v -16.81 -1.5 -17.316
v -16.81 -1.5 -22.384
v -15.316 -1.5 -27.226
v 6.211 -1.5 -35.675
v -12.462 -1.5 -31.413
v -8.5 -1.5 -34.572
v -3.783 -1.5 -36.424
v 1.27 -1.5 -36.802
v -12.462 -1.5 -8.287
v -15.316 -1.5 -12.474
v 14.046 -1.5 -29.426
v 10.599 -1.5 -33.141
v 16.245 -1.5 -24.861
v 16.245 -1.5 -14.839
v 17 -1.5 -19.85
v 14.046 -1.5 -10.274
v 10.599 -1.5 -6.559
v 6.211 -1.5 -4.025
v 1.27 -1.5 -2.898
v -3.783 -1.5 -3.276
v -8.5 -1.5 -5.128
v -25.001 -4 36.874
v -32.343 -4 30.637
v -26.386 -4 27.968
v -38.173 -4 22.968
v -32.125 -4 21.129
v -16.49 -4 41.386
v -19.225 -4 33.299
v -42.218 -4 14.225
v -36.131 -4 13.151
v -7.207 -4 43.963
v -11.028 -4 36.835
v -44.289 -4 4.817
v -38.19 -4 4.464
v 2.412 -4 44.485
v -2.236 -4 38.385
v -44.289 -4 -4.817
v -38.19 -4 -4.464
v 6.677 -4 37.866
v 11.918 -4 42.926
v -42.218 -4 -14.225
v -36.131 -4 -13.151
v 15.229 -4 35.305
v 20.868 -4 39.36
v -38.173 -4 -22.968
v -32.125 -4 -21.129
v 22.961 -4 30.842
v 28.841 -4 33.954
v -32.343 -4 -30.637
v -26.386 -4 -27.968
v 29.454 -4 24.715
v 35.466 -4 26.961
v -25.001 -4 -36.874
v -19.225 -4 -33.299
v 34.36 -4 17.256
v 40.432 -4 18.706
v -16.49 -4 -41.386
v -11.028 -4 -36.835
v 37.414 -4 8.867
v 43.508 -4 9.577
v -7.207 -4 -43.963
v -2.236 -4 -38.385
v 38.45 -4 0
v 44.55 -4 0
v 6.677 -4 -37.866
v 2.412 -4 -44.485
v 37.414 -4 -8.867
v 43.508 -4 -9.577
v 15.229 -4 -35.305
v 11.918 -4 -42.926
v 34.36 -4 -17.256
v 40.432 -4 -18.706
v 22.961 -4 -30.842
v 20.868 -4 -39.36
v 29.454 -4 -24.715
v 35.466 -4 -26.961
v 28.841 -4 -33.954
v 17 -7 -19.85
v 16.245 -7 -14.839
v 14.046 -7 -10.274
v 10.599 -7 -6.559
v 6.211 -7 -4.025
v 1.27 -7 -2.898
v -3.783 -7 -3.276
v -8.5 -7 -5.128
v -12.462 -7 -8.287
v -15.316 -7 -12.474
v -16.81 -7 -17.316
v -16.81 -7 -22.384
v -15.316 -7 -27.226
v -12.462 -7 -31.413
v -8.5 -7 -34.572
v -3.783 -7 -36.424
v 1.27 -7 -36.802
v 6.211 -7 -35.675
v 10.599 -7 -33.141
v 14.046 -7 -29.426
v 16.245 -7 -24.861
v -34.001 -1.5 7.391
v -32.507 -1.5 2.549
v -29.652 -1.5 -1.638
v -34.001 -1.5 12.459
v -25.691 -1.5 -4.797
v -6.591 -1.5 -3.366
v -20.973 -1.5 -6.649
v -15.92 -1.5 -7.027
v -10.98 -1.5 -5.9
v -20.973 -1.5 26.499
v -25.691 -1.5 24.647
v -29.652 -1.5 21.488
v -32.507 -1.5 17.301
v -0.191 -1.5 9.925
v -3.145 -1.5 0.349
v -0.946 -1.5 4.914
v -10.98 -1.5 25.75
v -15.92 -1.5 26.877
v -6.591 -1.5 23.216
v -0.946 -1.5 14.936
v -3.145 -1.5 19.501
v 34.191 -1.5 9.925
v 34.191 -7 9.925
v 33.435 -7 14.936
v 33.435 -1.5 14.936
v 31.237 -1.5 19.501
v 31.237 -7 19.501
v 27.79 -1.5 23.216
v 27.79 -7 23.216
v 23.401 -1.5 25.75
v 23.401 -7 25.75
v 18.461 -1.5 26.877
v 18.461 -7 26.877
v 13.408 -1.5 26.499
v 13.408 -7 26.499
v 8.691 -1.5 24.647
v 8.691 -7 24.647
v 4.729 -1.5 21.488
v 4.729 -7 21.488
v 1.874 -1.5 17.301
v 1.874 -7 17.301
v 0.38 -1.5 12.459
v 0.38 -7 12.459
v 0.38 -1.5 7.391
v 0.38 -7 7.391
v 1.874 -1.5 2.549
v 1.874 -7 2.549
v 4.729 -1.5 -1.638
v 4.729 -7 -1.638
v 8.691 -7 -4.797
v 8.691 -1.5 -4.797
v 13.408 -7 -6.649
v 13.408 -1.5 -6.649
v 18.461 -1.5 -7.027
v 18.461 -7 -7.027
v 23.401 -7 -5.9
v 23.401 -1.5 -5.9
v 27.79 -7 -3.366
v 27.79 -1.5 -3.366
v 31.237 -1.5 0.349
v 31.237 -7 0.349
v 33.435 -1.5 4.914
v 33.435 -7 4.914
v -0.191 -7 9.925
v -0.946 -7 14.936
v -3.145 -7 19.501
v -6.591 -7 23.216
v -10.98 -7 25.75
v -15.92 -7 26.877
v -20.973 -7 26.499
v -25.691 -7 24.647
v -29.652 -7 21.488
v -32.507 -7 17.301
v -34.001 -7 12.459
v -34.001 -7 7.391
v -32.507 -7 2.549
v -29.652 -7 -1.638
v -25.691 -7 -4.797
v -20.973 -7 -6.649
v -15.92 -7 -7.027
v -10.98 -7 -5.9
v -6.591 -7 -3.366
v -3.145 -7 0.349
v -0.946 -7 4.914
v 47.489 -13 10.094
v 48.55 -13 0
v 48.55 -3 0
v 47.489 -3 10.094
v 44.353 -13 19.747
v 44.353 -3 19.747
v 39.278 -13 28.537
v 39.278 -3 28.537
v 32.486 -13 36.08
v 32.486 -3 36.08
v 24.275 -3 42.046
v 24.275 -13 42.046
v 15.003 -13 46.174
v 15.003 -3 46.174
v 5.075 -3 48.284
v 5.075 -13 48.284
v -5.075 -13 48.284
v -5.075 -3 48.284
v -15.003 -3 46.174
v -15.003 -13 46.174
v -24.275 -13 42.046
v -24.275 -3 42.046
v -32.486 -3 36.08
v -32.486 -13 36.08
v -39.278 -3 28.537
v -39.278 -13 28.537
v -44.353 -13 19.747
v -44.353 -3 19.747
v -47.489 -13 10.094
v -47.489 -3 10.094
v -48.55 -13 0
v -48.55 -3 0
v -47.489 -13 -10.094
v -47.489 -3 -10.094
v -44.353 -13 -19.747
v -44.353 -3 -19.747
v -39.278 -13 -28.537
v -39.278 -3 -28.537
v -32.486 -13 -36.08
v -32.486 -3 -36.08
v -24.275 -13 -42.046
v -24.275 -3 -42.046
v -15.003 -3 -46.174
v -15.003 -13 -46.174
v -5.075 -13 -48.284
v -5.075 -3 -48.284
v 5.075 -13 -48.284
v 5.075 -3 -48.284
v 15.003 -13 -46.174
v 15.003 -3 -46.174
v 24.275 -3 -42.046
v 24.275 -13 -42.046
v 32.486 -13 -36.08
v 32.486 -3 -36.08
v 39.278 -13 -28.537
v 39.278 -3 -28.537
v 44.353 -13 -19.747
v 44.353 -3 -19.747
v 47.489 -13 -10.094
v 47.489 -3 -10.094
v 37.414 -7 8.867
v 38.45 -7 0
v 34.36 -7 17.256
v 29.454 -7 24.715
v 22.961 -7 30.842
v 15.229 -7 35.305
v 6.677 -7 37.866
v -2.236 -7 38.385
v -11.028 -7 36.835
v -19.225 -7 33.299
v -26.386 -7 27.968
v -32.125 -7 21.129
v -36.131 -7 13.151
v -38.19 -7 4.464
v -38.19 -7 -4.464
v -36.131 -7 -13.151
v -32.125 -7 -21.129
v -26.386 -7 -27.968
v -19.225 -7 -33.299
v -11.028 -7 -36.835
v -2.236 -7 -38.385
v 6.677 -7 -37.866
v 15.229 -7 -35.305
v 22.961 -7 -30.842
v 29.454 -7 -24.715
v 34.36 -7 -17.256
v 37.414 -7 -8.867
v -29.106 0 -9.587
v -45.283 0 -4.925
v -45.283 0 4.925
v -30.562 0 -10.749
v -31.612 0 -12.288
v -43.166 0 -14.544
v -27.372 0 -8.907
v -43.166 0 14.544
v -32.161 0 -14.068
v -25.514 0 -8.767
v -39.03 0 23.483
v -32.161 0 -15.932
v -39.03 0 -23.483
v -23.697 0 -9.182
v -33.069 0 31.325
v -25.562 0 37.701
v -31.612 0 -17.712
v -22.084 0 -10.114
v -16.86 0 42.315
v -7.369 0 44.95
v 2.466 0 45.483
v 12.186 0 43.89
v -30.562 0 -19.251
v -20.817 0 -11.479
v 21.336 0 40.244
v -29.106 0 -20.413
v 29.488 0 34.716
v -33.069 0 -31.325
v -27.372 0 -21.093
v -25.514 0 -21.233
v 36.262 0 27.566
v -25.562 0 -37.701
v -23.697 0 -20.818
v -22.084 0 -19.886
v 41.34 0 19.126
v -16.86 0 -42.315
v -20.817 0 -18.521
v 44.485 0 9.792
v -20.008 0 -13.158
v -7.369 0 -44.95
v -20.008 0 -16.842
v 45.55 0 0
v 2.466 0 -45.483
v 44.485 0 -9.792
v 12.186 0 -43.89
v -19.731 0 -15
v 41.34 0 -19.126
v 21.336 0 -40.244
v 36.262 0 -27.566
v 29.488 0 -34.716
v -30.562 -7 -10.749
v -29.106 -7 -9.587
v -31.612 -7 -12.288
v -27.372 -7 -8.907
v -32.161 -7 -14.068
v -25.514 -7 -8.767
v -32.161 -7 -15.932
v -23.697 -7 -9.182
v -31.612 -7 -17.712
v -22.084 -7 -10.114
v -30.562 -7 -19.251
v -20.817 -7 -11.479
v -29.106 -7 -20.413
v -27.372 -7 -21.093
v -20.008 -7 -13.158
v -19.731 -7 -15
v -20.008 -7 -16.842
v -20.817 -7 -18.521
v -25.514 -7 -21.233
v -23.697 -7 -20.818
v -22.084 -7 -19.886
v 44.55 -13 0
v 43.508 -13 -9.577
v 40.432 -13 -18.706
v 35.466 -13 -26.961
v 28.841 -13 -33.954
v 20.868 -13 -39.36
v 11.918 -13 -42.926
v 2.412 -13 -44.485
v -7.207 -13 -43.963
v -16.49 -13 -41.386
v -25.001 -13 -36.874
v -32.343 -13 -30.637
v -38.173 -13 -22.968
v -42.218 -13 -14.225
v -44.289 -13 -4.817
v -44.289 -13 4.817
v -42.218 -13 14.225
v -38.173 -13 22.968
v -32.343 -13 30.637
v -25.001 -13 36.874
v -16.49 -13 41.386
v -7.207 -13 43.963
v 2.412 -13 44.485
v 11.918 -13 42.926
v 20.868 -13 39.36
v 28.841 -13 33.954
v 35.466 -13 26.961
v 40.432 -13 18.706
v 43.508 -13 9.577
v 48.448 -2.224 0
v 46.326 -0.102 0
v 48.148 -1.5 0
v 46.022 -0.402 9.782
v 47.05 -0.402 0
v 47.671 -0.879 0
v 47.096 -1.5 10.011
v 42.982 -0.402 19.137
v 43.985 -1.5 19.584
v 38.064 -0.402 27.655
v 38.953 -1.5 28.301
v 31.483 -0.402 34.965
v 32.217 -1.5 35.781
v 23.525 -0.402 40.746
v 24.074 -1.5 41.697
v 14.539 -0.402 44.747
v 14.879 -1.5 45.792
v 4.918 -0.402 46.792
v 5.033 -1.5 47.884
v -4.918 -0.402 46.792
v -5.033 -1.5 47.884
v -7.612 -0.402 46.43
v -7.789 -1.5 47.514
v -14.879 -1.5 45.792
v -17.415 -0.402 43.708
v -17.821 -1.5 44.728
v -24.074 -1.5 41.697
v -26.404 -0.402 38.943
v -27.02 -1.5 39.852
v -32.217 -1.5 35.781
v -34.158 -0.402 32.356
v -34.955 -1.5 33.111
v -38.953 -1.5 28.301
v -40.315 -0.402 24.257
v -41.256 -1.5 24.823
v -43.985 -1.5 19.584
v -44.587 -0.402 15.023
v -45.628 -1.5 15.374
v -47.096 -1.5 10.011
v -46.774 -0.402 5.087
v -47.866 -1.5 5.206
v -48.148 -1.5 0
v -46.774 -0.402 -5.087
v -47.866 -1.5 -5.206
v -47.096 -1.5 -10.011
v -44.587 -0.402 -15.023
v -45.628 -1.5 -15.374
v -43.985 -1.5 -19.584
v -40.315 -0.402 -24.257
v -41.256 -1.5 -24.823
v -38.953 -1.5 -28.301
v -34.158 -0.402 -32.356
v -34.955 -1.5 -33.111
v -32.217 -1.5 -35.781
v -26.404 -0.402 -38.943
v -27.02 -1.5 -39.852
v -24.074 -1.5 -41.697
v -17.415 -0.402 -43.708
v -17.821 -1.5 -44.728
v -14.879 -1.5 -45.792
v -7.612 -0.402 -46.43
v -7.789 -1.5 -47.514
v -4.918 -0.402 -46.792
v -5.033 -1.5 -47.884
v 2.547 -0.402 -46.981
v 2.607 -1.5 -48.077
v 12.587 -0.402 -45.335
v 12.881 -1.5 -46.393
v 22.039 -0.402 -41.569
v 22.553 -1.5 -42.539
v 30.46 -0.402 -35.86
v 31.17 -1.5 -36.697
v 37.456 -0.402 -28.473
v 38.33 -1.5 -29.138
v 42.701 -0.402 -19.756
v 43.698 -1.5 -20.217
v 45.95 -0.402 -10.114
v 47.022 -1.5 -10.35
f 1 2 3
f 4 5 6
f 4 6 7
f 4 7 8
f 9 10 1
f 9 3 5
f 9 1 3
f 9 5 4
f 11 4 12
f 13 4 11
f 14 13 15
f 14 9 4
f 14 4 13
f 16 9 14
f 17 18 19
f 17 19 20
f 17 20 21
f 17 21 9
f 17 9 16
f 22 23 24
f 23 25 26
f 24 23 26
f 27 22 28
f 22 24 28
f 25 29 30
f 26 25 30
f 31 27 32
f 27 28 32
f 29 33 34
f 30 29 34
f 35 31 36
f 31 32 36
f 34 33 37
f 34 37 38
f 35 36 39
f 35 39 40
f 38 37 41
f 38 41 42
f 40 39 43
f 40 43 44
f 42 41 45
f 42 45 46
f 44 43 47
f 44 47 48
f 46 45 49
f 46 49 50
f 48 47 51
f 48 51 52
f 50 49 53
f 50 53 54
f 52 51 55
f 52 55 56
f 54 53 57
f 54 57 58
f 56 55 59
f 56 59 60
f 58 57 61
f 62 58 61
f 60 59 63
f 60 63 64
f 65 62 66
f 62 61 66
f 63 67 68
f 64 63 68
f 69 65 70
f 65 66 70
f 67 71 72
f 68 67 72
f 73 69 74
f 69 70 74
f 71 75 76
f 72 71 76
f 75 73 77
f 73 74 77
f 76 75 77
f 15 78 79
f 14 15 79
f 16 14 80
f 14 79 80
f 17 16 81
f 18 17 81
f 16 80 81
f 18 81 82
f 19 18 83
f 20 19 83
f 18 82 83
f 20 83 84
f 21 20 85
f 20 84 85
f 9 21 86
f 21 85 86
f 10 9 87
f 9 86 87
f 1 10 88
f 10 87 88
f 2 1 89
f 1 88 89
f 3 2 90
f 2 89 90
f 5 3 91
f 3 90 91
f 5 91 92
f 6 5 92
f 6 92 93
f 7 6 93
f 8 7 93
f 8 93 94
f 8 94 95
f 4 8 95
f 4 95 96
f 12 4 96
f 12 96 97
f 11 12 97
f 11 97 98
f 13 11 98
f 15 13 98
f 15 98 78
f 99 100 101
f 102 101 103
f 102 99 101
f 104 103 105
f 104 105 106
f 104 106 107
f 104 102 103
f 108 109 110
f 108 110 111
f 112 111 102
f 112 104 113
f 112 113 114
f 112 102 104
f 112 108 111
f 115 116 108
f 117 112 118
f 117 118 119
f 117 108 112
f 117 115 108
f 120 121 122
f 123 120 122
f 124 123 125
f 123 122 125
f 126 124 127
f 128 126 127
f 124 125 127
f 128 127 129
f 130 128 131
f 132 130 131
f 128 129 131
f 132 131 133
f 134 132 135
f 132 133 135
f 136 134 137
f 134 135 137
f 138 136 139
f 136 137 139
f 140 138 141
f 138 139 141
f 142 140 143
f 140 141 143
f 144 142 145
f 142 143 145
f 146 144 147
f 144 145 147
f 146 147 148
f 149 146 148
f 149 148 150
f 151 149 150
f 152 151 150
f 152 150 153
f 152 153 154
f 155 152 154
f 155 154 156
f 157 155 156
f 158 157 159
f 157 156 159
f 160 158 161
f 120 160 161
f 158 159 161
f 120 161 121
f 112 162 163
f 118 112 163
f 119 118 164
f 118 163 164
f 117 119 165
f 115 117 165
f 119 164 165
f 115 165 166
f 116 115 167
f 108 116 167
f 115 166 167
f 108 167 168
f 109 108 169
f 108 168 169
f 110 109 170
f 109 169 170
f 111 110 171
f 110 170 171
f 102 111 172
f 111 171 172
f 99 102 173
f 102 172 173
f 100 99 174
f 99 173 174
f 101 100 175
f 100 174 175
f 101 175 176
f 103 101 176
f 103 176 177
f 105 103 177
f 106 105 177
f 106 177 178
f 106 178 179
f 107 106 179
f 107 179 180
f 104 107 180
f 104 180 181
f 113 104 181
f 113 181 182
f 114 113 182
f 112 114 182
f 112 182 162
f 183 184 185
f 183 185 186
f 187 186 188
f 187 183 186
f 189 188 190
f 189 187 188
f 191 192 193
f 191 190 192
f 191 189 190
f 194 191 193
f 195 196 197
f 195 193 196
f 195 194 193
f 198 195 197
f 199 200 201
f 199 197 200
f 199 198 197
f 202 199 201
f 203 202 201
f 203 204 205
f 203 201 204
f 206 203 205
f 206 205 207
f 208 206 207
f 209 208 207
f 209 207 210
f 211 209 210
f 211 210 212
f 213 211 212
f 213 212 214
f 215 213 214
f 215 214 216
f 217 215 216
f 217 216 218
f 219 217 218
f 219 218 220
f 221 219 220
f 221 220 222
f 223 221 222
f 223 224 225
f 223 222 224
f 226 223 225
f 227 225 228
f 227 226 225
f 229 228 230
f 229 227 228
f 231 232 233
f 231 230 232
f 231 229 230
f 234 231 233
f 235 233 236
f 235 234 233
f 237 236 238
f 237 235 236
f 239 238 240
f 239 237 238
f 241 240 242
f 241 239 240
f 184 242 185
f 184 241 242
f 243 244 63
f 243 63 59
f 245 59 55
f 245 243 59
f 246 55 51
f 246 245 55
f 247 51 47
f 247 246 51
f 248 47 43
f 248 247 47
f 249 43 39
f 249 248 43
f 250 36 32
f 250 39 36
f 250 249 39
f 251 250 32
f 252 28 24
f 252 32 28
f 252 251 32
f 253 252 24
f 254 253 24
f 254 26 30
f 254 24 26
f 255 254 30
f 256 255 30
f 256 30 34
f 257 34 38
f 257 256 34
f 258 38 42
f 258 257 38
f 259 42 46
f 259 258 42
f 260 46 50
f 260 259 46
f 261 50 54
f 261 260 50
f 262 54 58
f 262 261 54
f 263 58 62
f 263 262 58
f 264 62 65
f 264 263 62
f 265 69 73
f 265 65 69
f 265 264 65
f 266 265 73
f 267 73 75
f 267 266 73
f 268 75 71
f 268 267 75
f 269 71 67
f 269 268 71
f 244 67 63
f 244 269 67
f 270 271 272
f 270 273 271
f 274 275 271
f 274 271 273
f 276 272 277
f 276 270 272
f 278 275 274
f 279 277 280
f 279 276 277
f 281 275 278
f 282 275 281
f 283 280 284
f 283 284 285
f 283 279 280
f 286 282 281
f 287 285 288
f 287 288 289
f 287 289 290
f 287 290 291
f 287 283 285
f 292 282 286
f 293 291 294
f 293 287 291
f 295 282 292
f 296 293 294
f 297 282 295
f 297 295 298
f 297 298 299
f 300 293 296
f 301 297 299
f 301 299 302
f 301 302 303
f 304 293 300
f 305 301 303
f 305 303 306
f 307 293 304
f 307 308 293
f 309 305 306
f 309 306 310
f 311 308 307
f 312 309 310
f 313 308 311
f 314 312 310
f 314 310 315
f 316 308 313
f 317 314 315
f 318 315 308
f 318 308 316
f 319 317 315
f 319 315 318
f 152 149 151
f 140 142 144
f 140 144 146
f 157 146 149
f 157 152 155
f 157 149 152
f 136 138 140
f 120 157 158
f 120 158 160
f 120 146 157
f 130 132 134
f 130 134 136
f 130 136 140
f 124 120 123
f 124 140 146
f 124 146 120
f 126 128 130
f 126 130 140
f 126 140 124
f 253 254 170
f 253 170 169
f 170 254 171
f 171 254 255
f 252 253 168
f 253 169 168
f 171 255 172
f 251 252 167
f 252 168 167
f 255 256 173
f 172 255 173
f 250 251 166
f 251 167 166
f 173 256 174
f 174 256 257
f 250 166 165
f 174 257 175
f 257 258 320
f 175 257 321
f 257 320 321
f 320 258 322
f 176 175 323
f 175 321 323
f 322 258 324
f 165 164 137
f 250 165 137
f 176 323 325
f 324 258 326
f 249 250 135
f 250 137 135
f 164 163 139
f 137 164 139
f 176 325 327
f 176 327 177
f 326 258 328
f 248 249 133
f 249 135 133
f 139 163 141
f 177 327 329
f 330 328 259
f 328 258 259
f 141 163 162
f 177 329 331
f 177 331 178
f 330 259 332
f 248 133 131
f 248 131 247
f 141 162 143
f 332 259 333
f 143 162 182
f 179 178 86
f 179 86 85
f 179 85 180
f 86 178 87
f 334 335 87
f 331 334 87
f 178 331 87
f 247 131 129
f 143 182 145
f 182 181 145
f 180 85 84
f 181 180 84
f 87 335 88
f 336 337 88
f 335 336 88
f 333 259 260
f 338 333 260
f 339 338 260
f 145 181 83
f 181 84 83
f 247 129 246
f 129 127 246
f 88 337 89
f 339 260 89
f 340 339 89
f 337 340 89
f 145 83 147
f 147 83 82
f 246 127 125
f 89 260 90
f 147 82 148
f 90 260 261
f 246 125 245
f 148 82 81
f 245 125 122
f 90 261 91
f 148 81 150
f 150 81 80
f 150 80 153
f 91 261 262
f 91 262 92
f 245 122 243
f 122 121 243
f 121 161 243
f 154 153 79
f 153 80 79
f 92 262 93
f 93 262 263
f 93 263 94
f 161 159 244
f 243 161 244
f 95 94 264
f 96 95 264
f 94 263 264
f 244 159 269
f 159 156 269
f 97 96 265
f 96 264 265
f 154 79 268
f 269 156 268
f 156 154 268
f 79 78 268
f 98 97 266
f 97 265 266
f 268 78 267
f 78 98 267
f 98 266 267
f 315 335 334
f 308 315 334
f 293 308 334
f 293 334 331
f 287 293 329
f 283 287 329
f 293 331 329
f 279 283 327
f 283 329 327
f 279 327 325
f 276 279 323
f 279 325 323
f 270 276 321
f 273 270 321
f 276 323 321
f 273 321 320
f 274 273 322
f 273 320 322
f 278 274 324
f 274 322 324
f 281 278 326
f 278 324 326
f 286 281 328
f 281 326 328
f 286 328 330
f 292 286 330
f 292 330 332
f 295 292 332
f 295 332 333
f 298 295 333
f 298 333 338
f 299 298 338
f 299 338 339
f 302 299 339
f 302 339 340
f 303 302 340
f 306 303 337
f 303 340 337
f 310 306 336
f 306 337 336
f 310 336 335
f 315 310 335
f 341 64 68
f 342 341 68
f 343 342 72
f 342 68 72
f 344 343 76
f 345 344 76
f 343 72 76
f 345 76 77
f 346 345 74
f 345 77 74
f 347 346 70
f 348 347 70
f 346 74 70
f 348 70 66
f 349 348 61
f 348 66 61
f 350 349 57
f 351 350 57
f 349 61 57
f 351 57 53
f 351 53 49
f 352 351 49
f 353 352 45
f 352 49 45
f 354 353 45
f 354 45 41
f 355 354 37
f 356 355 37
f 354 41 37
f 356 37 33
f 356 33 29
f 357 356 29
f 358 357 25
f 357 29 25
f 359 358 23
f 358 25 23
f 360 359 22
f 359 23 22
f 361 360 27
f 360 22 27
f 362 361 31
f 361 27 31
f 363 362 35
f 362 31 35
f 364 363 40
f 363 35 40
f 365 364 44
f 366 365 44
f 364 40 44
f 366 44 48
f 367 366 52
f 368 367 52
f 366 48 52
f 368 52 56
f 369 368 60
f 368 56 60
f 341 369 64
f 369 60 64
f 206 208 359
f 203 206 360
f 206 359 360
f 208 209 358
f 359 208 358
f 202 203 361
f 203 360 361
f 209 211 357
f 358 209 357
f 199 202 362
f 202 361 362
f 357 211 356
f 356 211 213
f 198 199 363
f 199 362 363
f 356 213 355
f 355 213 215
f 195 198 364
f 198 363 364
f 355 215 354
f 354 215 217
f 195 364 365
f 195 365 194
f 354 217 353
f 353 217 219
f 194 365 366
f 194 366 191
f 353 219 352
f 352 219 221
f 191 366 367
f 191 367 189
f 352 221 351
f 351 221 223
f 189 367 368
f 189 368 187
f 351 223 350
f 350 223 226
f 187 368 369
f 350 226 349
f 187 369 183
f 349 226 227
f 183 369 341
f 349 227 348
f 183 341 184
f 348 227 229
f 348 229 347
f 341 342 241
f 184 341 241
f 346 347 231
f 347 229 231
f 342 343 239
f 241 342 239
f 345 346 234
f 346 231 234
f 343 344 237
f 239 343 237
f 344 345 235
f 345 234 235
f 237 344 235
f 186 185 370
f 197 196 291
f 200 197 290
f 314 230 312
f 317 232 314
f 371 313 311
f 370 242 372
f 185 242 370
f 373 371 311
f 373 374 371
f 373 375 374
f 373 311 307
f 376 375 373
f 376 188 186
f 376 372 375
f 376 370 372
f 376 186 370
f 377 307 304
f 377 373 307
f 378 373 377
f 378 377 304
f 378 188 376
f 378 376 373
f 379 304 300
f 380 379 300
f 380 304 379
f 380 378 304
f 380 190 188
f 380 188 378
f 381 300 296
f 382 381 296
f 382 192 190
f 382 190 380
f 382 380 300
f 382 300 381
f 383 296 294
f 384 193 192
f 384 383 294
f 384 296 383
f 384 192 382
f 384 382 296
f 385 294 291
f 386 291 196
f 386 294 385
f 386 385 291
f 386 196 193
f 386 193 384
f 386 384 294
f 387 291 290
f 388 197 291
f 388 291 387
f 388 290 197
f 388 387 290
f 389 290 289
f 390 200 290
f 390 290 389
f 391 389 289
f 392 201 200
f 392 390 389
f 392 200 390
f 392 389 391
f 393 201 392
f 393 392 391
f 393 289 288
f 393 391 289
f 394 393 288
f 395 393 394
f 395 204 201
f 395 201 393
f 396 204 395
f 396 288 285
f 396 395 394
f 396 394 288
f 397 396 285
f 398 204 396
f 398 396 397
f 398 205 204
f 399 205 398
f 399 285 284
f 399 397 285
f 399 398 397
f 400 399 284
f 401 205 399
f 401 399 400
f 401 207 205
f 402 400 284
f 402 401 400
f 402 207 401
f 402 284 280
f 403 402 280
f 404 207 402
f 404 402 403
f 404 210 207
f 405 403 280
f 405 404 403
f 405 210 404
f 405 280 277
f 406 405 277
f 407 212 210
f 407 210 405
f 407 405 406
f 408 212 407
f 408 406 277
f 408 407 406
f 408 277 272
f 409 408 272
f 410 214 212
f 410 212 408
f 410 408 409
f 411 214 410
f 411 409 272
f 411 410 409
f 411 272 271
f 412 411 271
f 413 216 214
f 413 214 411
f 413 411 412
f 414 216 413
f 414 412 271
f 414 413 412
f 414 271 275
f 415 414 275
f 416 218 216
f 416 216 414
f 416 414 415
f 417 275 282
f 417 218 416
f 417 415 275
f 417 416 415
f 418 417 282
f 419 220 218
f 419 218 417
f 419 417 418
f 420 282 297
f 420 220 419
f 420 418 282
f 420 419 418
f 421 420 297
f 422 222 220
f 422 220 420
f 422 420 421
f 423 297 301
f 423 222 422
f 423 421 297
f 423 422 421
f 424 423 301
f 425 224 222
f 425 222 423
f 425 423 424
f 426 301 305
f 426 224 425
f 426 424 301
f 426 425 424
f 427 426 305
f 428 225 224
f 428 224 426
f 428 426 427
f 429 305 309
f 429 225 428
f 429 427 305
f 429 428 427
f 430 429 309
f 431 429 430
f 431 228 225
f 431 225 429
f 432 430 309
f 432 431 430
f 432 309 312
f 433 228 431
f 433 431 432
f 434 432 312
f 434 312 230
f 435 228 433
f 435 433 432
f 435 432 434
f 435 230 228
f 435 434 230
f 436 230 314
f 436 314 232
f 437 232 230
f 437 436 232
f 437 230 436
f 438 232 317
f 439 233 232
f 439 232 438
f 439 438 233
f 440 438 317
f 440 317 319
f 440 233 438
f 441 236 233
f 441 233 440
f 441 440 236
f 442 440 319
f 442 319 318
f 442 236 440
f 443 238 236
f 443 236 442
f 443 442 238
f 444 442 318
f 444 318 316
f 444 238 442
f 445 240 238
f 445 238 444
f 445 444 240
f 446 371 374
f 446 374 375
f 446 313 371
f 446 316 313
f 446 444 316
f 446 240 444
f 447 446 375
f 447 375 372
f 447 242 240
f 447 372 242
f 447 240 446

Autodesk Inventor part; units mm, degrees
ref_plane "YZ Plane" through (0, 0, 0) normal (1, 0, 0) x (0, 1, 0)
ref_plane "XZ Plane" through (0, 0, 0) normal (0, 1, 0) x (-1, 0, 0)
ref_plane "XY Plane" through (0, 0, 0) normal (0, 0, 1) x (1, 0, 0)
sketch "Sketch2" plane through (0, 0, 0) normal (0, 0, 1) x (1, 0, 0)
  line L0 (0, 0) -> (48.55, 0)
  line L1 (48.55, 0) -> (48.55, -13)
  line L2 (48.55, -13) -> (44.55, -13)
  line L3 (44.55, -13) -> (44.55, -4)
  line L4 (44.55, -4) -> (38.45, -4)
  line L5 (38.45, -4) -> (38.45, -7)
  line L6 (38.45, -7) -> (0, -7)
  line L7 (0, -7) -> (0, 0)
  dimension "d0" = 48.55
  dimension "d1" = 4
  dimension "d2" = 6.1
  dimension "d3" = 13
  dimension "d4" = 4
  dimension "d5" = 7
revolve "Revolution1" add sketch "Sketch2" angle 360 about axis through (0, -7, 0) along (0, 1, 0)
fillet "Fillet1" radius 3 1 edges at (-48.55, 0, 0)
sketch "Sketch3" plane through (0, -7, 0) normal (0, -1, 0) x (1, 0, 0)
  circle A0 centre (0, -19.85) radius 17
  circle A1 centre (0, 0) radius 38.45 projected
  circle A2 centre (17.1906, 9.925) radius 17
  circle A3 centre (-17.1906, 9.925) radius 17
  dimension "d8" = 34
  dimension "d11" = 360
  dimension "d15" = 19.85
extrude "Extrusion1" cut sketch "Sketch3" against normal blind 5.5 contours A0 | A2 | A3
sketch "Sketch5" plane through (0, -7, 0) normal (0, -1, 0) x (1, 0, 0)
  circle A0 centre (-25.9808, -15) radius 6.25
  line L0 (-25.9808, -15) -> (0, 0) construction
  line L1 (0, 0) -> (-9.9215, 0) construction
  dimension "d16" = 12.5
  dimension "d17" = 30
  dimension "d20" = 30
extrude "Extrusion2" cut sketch "Sketch5" against normal through all
properties part number "lid-proto-v2"
